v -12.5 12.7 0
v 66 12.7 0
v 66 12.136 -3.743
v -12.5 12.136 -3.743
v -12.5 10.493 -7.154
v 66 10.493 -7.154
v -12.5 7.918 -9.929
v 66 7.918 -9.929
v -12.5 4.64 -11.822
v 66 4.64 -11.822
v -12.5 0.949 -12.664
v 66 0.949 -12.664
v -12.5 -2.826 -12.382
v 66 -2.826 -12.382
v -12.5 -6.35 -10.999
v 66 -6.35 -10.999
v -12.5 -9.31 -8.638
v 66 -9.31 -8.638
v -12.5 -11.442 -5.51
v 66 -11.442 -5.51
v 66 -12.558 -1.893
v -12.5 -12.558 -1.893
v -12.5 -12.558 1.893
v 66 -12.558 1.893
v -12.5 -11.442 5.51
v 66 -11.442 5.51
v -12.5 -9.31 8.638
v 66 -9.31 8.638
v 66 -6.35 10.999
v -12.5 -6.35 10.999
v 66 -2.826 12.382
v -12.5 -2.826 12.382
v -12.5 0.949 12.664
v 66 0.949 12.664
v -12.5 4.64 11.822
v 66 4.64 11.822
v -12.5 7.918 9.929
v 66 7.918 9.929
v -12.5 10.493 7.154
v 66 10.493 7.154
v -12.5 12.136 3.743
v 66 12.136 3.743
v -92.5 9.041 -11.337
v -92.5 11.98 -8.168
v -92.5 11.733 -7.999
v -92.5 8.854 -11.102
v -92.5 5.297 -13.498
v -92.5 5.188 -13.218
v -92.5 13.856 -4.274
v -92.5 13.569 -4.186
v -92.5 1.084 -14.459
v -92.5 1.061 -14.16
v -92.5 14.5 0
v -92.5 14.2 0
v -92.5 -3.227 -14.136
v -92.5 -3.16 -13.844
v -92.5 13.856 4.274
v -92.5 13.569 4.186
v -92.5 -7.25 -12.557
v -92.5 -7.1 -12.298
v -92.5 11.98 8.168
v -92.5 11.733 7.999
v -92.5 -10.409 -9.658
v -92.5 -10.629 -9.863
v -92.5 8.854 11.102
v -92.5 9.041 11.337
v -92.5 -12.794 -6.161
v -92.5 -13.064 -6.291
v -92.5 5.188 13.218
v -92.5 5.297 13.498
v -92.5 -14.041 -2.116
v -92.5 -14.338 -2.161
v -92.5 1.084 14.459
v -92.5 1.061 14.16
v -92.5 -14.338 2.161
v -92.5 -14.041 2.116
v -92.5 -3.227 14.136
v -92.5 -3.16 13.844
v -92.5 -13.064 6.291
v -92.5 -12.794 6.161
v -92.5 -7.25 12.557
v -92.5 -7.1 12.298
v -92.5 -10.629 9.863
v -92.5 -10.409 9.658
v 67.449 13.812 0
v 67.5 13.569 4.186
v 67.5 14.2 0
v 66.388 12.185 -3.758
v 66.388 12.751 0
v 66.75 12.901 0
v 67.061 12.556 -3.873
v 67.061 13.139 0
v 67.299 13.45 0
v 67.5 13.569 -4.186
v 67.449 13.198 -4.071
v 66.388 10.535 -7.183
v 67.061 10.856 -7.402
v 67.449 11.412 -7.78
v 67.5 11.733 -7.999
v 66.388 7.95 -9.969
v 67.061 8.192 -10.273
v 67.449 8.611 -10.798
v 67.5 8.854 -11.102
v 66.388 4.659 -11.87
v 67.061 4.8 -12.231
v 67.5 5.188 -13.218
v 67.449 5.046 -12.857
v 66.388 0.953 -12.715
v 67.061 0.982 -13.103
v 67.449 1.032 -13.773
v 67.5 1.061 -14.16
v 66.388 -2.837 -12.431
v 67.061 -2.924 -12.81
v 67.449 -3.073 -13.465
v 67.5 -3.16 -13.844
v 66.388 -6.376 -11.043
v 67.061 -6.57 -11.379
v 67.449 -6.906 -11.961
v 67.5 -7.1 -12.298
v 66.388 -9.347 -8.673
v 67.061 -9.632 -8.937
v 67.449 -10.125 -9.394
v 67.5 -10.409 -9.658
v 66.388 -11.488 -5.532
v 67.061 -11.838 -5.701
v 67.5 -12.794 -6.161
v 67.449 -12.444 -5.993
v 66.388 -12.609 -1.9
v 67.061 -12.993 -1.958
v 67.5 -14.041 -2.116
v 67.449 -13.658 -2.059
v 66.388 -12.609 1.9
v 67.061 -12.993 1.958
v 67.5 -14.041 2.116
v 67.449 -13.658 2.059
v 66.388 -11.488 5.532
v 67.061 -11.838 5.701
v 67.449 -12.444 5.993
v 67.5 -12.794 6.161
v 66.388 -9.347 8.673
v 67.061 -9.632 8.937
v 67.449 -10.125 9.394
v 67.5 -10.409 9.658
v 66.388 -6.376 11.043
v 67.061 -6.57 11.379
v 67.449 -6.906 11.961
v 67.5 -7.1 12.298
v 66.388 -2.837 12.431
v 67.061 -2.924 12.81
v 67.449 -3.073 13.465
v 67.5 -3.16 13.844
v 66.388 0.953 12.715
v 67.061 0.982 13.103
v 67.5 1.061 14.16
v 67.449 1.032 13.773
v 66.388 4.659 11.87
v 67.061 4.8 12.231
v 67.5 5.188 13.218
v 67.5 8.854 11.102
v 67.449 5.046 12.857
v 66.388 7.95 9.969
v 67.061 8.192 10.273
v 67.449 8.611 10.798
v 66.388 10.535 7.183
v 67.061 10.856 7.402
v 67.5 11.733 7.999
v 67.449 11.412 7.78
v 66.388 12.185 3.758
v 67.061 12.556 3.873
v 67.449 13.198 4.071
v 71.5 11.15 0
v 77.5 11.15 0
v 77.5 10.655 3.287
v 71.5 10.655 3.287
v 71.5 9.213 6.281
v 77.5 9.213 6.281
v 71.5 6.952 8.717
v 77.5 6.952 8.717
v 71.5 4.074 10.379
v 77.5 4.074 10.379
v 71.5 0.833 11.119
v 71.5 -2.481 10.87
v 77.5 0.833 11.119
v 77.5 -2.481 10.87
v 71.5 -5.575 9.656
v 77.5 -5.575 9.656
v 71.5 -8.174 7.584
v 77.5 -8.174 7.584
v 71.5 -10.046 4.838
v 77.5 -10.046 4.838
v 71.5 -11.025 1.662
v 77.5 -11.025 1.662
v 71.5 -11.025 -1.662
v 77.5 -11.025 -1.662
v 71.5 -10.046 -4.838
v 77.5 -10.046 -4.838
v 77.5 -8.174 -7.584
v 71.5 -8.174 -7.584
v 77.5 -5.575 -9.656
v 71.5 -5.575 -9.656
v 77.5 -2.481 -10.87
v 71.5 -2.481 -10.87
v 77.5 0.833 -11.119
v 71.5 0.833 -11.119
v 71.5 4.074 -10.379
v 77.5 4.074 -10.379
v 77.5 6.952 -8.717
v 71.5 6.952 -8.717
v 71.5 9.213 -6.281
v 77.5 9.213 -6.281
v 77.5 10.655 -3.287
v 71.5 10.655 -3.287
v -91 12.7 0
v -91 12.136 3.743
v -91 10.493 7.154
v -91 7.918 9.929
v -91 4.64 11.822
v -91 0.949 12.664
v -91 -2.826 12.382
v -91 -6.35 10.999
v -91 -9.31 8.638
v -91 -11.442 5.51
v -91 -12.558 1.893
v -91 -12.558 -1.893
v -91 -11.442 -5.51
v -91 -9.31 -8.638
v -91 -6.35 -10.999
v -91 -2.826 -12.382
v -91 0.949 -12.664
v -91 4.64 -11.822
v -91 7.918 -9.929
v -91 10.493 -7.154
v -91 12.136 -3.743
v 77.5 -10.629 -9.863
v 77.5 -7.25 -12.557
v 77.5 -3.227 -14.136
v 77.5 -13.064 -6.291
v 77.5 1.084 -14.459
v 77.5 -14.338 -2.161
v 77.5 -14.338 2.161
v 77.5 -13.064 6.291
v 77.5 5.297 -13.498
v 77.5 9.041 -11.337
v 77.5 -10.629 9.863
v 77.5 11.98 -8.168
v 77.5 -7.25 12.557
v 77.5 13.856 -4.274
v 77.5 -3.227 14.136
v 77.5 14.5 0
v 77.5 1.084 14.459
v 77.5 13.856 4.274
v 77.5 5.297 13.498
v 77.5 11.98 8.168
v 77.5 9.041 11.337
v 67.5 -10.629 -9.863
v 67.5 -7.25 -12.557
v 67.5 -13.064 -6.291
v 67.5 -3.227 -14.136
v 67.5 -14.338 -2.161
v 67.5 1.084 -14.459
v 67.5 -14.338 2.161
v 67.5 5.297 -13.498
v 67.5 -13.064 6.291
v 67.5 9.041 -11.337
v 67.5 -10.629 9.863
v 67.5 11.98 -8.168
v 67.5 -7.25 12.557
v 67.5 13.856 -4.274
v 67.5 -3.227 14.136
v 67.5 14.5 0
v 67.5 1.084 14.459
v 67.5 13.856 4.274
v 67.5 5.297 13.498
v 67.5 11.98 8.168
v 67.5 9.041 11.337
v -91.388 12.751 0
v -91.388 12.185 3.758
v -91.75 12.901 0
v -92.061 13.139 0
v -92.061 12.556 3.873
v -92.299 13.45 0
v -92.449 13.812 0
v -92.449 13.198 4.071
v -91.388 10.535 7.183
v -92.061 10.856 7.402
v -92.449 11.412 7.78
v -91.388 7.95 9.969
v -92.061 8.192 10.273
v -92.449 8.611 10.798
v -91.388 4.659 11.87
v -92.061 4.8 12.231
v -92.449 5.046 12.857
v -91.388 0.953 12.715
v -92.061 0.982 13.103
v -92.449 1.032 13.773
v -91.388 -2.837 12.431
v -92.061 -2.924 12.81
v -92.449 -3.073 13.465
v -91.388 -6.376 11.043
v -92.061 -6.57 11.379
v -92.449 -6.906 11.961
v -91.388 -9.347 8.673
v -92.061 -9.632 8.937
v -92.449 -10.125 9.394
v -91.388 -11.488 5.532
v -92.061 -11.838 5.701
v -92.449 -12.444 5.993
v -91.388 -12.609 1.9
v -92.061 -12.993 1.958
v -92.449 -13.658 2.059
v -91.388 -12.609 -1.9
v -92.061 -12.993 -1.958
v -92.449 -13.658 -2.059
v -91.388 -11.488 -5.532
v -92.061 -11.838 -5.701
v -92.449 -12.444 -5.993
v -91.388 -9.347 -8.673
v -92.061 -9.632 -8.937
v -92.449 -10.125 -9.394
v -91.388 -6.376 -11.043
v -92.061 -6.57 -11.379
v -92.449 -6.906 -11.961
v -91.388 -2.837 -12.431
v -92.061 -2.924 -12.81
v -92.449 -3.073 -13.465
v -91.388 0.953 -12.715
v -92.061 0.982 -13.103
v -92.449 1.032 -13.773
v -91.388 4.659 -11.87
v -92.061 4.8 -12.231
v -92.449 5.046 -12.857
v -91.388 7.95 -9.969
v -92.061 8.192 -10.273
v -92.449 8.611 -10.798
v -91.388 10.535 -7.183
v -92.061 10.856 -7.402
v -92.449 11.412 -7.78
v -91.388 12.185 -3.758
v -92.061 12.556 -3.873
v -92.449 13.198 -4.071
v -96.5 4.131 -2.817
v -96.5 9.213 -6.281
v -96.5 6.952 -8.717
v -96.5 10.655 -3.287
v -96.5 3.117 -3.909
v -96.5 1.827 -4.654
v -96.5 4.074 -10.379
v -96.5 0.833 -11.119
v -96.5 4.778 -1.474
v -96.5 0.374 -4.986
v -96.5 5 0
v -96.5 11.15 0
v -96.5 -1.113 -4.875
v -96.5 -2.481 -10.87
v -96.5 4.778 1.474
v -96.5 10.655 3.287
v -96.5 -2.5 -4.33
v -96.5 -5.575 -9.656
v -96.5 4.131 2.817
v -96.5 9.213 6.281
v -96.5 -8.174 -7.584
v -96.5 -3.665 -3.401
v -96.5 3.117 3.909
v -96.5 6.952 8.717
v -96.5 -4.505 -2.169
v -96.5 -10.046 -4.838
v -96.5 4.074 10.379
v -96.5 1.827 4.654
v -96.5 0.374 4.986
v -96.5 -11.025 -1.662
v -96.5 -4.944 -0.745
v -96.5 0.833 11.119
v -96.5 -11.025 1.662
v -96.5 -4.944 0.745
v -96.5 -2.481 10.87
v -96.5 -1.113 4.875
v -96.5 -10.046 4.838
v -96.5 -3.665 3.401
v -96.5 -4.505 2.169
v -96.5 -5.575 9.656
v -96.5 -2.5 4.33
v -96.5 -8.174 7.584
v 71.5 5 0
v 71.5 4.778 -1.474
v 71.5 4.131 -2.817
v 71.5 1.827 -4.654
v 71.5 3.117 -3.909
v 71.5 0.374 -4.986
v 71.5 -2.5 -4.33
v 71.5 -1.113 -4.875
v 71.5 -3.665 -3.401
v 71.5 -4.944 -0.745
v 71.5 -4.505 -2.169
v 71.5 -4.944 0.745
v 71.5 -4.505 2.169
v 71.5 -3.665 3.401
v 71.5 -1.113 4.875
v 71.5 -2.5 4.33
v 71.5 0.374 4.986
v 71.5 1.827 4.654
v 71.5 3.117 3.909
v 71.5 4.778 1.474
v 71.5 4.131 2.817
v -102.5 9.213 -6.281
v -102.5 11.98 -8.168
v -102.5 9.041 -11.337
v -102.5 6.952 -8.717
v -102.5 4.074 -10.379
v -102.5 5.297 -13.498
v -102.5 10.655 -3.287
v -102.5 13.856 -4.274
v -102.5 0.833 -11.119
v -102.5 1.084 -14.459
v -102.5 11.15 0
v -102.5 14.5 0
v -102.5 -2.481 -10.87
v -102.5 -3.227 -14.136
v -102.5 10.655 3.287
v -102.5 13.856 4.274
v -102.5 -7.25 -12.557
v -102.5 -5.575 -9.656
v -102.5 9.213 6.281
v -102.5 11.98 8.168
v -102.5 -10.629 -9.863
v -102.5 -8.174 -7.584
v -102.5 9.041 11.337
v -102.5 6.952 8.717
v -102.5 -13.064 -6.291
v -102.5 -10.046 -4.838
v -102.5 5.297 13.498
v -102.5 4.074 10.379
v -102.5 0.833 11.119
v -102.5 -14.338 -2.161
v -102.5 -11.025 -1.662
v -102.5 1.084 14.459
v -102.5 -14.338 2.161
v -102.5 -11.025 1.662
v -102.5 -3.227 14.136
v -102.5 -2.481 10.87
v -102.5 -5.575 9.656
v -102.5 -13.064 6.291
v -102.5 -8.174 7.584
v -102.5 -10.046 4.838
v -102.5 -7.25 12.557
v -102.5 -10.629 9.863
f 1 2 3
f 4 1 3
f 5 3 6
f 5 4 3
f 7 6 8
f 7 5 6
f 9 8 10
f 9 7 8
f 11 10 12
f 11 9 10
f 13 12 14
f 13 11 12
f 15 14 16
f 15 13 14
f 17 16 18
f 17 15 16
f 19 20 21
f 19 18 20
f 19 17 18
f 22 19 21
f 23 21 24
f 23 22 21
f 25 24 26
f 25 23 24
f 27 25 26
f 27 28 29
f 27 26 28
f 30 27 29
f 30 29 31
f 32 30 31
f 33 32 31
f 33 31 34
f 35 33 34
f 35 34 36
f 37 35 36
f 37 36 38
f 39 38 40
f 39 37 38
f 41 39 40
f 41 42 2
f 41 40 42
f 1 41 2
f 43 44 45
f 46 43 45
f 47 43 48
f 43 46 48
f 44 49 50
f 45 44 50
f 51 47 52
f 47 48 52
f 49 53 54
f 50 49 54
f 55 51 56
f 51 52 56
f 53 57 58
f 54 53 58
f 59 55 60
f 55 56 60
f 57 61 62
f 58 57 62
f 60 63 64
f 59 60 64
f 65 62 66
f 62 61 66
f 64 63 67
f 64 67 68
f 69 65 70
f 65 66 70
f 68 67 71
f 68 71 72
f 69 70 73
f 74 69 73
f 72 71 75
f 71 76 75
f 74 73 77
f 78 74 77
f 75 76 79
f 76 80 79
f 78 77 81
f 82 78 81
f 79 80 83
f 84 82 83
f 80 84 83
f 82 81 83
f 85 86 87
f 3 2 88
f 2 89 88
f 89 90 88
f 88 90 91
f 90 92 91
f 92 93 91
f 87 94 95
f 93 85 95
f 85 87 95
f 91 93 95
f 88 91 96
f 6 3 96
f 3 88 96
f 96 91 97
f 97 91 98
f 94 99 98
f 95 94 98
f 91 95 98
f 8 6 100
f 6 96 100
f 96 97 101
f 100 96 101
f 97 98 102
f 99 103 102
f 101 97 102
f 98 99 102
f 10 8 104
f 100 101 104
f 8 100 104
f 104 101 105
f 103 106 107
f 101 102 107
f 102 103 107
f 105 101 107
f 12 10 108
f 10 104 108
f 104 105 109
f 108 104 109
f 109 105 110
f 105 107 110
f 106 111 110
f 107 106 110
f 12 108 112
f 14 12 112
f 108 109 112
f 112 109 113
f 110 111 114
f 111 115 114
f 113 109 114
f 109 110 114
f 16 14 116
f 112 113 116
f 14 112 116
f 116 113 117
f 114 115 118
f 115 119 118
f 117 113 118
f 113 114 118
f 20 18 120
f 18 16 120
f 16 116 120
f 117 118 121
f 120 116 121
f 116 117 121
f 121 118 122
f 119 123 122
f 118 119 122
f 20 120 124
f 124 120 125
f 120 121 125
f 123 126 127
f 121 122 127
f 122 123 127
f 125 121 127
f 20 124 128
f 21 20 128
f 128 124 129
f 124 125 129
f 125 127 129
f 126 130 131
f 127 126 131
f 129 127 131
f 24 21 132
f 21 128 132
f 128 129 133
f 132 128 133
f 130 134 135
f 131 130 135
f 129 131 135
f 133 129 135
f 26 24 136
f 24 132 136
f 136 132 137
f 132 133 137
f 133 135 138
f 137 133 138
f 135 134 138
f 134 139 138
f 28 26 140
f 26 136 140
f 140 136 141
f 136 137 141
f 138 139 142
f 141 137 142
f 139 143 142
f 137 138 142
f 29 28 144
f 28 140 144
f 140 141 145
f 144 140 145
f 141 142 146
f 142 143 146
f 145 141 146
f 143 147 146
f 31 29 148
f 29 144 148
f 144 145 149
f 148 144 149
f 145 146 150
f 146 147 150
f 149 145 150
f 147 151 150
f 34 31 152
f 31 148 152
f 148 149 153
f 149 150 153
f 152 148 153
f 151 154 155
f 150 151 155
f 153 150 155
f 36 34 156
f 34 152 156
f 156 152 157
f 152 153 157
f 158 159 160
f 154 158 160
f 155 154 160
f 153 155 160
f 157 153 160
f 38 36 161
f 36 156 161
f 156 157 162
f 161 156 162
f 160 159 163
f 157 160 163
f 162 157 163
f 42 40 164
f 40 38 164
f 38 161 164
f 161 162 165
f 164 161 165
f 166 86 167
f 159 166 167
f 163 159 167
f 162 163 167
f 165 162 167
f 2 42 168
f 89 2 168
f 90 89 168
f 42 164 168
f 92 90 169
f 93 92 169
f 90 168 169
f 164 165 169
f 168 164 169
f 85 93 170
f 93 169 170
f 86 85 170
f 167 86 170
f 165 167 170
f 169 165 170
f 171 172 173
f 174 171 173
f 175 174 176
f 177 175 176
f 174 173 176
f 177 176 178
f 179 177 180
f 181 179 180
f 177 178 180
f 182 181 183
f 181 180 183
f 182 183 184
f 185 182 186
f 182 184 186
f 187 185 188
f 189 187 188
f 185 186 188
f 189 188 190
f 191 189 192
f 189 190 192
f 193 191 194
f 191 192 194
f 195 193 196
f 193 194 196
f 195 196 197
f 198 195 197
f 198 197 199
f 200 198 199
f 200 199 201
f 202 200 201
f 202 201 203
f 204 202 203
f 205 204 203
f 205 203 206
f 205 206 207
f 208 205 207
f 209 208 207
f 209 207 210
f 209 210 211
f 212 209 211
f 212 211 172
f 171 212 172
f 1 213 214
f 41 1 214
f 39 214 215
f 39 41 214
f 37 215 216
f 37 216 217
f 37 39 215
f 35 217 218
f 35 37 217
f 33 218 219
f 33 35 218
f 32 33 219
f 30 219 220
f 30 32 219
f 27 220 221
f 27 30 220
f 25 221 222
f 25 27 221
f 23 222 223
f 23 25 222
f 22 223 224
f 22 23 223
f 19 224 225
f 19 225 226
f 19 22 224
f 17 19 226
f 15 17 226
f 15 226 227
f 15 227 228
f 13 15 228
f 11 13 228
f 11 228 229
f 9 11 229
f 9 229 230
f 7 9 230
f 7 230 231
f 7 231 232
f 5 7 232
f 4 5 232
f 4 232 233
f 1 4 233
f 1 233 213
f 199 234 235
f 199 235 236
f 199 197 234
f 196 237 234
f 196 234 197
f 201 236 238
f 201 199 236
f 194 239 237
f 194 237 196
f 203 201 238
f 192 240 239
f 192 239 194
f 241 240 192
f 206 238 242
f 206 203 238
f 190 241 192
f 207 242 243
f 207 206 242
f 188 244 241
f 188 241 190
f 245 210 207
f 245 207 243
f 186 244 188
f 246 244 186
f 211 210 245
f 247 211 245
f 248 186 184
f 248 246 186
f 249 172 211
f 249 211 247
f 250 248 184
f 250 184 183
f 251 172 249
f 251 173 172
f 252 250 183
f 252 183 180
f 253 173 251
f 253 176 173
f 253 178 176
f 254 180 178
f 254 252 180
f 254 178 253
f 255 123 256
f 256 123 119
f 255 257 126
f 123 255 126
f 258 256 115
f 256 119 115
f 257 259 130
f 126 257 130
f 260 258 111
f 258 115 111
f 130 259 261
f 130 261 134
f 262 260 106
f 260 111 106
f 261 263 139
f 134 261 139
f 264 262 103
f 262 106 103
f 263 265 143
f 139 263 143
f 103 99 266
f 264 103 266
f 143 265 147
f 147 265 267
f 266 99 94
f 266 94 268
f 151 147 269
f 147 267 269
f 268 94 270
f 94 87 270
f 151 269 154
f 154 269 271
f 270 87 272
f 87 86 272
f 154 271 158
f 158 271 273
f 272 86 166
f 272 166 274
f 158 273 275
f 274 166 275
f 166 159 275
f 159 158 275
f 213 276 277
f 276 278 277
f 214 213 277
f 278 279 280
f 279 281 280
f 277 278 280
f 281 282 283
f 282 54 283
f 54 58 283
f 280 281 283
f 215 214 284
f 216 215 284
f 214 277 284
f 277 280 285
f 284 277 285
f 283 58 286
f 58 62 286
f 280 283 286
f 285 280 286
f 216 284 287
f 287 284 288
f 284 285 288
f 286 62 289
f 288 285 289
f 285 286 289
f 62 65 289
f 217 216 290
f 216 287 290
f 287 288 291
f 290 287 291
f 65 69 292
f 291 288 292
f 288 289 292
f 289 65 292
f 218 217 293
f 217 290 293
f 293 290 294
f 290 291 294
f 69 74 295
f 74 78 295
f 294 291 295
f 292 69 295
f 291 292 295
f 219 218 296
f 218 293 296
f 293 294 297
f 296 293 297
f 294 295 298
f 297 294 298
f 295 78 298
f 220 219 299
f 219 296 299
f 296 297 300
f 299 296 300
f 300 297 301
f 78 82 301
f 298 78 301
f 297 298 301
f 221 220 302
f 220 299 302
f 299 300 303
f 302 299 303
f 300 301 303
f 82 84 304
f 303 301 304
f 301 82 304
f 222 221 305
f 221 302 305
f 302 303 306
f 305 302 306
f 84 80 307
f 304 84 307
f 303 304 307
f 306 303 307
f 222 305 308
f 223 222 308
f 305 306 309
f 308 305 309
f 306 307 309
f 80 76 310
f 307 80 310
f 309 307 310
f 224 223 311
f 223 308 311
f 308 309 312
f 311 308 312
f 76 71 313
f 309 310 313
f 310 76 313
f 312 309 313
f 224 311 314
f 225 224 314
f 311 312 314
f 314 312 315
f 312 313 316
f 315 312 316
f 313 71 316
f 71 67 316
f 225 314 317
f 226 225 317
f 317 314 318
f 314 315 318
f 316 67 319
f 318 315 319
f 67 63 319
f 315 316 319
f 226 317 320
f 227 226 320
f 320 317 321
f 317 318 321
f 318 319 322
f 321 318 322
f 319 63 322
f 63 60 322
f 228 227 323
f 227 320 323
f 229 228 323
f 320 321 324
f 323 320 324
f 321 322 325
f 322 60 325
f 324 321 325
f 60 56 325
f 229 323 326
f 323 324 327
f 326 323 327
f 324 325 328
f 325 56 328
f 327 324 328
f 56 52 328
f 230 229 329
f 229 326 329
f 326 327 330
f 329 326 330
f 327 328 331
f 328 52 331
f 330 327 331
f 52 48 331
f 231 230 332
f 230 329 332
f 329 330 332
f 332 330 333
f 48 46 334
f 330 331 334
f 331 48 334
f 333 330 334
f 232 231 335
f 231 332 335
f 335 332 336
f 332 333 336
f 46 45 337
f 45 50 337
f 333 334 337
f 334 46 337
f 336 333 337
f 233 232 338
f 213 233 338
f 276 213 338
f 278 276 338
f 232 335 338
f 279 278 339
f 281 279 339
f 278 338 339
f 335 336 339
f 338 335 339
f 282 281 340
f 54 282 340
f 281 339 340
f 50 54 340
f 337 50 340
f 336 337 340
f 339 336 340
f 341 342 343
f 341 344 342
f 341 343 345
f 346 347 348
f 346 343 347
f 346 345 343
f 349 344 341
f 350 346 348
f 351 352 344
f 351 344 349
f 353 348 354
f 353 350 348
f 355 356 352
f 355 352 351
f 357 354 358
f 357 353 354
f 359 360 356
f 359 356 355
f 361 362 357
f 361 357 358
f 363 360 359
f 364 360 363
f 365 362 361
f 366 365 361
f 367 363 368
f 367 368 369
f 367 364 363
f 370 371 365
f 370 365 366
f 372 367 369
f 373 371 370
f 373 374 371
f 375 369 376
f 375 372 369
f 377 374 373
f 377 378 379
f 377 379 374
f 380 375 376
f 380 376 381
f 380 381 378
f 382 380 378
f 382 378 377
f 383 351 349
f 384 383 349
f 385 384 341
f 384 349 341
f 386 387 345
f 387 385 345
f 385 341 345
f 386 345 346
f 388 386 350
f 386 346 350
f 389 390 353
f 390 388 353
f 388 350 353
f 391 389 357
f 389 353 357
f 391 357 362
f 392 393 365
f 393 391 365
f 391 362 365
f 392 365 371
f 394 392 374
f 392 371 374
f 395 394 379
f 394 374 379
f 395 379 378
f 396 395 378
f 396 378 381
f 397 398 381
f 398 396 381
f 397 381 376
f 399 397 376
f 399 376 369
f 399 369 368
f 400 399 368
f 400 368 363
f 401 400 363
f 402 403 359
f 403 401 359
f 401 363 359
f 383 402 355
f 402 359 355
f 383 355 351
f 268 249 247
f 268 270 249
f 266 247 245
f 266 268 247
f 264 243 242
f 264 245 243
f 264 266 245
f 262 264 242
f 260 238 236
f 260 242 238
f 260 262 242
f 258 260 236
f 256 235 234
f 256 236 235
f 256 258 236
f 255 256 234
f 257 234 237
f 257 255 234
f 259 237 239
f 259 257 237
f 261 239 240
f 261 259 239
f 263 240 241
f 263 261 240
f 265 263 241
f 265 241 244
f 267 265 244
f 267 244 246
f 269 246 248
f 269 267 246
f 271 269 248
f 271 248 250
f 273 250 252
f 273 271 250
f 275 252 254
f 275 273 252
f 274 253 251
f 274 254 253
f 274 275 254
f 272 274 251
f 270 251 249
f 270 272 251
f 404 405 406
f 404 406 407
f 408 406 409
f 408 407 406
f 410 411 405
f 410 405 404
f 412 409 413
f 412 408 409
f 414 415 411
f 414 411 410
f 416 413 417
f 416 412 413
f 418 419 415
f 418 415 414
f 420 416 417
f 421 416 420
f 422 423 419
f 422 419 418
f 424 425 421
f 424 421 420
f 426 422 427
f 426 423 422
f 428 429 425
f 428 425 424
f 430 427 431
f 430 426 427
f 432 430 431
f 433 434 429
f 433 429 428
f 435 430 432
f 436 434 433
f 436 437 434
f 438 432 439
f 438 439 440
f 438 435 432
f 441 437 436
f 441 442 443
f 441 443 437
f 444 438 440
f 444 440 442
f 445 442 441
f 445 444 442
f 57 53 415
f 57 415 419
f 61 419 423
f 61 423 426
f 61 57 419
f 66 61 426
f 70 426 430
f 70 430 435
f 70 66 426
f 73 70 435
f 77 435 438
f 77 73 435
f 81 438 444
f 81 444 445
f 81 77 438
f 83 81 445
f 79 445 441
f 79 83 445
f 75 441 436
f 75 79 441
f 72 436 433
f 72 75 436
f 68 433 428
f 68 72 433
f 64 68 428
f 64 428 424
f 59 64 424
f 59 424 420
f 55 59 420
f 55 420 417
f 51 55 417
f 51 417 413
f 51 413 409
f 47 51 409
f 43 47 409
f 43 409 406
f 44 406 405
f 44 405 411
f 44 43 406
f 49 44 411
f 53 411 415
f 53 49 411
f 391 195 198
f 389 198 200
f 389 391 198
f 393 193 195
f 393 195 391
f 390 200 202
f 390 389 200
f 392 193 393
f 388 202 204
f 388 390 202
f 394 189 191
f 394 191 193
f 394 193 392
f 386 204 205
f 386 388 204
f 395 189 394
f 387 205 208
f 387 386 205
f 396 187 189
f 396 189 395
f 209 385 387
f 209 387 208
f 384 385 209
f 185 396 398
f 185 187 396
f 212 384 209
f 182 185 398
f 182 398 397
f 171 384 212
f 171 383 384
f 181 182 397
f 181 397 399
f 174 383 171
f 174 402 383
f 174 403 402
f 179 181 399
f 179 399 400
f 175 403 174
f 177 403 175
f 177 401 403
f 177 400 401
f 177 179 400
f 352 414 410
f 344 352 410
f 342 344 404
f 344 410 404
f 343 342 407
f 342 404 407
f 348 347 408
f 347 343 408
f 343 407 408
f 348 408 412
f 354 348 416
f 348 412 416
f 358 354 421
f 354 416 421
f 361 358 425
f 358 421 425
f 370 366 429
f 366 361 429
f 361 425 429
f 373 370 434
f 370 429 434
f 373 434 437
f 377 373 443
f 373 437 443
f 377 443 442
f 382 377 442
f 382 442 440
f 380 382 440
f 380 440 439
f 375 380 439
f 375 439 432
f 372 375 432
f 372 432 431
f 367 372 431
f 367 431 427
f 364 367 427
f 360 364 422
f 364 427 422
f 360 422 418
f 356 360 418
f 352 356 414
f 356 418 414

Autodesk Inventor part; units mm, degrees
ref_plane "YZ Plane" through (0, 0, 0) normal (1, 0, 0) x (0, 1, 0)
ref_plane "XZ Plane" through (0, 0, 0) normal (0, 1, 0) x (-1, 0, 0)
sketch "Sketch5" plane through (0, 0, 0) normal (0, 0, 1) x (1, 0, 0)
  line L0 (71.5, 5) -> (71.5, 11.15)
  line L1 (71.5, 11.15) -> (77.5, 11.15)
  line L2 (77.5, 11.15) -> (77.5, 14.5)
  line L3 (77.5, 14.5) -> (67.5, 14.5)
  line L4 (67.5, 14.5) -> (67.5, 14.2)
  line L5 (66, 12.7) -> (-12.5, 12.7)
  line L6 (71.5, 5) -> (-12.5, 5)
  line L7 (-12.5, 5) -> (-12.5, 12.7)
  line L8 (0, 0) -> (106.4906, 0) construction
  line L9 (67.5, 14.2) -> (67.5, 14.2)
  arc A0 (66, 12.7) -> (67.5, 14.2) centre (66, 14.2) ccw
  line L10 (35.25, 16.2) -> (60.7131, 16.2)
  point P0 (67.5, 12.7)
  point P1 (67.5, 14.5)
  point P2 (67.5, 14.2)
  dimension "d12" = 5
  dimension "d14" = 6
  dimension "d16" = 11.15
  dimension "d17" = 14.5
  dimension "d19" = 10
  dimension "d27" = 80
  dimension "d28" = 1.5
  dimension "d29" = 12.7
  dimension "d30" = 3.5
revolve "Revolution1" add sketch "Sketch5" angle 360 about axis through (0, 0, 0) along (1, 0, 0)
ref_plane "Work Plane1" through (-12.5, 0, 0) normal (-1, 0, 0) x (0, 0, 1)
mirror "Mirror1" about plane through (-12.5, 0, 0) normal (-1, 0, 0) of "Revolution1"
properties part number "12111_Proximal Roller_V1" material "ABS Plastic"
